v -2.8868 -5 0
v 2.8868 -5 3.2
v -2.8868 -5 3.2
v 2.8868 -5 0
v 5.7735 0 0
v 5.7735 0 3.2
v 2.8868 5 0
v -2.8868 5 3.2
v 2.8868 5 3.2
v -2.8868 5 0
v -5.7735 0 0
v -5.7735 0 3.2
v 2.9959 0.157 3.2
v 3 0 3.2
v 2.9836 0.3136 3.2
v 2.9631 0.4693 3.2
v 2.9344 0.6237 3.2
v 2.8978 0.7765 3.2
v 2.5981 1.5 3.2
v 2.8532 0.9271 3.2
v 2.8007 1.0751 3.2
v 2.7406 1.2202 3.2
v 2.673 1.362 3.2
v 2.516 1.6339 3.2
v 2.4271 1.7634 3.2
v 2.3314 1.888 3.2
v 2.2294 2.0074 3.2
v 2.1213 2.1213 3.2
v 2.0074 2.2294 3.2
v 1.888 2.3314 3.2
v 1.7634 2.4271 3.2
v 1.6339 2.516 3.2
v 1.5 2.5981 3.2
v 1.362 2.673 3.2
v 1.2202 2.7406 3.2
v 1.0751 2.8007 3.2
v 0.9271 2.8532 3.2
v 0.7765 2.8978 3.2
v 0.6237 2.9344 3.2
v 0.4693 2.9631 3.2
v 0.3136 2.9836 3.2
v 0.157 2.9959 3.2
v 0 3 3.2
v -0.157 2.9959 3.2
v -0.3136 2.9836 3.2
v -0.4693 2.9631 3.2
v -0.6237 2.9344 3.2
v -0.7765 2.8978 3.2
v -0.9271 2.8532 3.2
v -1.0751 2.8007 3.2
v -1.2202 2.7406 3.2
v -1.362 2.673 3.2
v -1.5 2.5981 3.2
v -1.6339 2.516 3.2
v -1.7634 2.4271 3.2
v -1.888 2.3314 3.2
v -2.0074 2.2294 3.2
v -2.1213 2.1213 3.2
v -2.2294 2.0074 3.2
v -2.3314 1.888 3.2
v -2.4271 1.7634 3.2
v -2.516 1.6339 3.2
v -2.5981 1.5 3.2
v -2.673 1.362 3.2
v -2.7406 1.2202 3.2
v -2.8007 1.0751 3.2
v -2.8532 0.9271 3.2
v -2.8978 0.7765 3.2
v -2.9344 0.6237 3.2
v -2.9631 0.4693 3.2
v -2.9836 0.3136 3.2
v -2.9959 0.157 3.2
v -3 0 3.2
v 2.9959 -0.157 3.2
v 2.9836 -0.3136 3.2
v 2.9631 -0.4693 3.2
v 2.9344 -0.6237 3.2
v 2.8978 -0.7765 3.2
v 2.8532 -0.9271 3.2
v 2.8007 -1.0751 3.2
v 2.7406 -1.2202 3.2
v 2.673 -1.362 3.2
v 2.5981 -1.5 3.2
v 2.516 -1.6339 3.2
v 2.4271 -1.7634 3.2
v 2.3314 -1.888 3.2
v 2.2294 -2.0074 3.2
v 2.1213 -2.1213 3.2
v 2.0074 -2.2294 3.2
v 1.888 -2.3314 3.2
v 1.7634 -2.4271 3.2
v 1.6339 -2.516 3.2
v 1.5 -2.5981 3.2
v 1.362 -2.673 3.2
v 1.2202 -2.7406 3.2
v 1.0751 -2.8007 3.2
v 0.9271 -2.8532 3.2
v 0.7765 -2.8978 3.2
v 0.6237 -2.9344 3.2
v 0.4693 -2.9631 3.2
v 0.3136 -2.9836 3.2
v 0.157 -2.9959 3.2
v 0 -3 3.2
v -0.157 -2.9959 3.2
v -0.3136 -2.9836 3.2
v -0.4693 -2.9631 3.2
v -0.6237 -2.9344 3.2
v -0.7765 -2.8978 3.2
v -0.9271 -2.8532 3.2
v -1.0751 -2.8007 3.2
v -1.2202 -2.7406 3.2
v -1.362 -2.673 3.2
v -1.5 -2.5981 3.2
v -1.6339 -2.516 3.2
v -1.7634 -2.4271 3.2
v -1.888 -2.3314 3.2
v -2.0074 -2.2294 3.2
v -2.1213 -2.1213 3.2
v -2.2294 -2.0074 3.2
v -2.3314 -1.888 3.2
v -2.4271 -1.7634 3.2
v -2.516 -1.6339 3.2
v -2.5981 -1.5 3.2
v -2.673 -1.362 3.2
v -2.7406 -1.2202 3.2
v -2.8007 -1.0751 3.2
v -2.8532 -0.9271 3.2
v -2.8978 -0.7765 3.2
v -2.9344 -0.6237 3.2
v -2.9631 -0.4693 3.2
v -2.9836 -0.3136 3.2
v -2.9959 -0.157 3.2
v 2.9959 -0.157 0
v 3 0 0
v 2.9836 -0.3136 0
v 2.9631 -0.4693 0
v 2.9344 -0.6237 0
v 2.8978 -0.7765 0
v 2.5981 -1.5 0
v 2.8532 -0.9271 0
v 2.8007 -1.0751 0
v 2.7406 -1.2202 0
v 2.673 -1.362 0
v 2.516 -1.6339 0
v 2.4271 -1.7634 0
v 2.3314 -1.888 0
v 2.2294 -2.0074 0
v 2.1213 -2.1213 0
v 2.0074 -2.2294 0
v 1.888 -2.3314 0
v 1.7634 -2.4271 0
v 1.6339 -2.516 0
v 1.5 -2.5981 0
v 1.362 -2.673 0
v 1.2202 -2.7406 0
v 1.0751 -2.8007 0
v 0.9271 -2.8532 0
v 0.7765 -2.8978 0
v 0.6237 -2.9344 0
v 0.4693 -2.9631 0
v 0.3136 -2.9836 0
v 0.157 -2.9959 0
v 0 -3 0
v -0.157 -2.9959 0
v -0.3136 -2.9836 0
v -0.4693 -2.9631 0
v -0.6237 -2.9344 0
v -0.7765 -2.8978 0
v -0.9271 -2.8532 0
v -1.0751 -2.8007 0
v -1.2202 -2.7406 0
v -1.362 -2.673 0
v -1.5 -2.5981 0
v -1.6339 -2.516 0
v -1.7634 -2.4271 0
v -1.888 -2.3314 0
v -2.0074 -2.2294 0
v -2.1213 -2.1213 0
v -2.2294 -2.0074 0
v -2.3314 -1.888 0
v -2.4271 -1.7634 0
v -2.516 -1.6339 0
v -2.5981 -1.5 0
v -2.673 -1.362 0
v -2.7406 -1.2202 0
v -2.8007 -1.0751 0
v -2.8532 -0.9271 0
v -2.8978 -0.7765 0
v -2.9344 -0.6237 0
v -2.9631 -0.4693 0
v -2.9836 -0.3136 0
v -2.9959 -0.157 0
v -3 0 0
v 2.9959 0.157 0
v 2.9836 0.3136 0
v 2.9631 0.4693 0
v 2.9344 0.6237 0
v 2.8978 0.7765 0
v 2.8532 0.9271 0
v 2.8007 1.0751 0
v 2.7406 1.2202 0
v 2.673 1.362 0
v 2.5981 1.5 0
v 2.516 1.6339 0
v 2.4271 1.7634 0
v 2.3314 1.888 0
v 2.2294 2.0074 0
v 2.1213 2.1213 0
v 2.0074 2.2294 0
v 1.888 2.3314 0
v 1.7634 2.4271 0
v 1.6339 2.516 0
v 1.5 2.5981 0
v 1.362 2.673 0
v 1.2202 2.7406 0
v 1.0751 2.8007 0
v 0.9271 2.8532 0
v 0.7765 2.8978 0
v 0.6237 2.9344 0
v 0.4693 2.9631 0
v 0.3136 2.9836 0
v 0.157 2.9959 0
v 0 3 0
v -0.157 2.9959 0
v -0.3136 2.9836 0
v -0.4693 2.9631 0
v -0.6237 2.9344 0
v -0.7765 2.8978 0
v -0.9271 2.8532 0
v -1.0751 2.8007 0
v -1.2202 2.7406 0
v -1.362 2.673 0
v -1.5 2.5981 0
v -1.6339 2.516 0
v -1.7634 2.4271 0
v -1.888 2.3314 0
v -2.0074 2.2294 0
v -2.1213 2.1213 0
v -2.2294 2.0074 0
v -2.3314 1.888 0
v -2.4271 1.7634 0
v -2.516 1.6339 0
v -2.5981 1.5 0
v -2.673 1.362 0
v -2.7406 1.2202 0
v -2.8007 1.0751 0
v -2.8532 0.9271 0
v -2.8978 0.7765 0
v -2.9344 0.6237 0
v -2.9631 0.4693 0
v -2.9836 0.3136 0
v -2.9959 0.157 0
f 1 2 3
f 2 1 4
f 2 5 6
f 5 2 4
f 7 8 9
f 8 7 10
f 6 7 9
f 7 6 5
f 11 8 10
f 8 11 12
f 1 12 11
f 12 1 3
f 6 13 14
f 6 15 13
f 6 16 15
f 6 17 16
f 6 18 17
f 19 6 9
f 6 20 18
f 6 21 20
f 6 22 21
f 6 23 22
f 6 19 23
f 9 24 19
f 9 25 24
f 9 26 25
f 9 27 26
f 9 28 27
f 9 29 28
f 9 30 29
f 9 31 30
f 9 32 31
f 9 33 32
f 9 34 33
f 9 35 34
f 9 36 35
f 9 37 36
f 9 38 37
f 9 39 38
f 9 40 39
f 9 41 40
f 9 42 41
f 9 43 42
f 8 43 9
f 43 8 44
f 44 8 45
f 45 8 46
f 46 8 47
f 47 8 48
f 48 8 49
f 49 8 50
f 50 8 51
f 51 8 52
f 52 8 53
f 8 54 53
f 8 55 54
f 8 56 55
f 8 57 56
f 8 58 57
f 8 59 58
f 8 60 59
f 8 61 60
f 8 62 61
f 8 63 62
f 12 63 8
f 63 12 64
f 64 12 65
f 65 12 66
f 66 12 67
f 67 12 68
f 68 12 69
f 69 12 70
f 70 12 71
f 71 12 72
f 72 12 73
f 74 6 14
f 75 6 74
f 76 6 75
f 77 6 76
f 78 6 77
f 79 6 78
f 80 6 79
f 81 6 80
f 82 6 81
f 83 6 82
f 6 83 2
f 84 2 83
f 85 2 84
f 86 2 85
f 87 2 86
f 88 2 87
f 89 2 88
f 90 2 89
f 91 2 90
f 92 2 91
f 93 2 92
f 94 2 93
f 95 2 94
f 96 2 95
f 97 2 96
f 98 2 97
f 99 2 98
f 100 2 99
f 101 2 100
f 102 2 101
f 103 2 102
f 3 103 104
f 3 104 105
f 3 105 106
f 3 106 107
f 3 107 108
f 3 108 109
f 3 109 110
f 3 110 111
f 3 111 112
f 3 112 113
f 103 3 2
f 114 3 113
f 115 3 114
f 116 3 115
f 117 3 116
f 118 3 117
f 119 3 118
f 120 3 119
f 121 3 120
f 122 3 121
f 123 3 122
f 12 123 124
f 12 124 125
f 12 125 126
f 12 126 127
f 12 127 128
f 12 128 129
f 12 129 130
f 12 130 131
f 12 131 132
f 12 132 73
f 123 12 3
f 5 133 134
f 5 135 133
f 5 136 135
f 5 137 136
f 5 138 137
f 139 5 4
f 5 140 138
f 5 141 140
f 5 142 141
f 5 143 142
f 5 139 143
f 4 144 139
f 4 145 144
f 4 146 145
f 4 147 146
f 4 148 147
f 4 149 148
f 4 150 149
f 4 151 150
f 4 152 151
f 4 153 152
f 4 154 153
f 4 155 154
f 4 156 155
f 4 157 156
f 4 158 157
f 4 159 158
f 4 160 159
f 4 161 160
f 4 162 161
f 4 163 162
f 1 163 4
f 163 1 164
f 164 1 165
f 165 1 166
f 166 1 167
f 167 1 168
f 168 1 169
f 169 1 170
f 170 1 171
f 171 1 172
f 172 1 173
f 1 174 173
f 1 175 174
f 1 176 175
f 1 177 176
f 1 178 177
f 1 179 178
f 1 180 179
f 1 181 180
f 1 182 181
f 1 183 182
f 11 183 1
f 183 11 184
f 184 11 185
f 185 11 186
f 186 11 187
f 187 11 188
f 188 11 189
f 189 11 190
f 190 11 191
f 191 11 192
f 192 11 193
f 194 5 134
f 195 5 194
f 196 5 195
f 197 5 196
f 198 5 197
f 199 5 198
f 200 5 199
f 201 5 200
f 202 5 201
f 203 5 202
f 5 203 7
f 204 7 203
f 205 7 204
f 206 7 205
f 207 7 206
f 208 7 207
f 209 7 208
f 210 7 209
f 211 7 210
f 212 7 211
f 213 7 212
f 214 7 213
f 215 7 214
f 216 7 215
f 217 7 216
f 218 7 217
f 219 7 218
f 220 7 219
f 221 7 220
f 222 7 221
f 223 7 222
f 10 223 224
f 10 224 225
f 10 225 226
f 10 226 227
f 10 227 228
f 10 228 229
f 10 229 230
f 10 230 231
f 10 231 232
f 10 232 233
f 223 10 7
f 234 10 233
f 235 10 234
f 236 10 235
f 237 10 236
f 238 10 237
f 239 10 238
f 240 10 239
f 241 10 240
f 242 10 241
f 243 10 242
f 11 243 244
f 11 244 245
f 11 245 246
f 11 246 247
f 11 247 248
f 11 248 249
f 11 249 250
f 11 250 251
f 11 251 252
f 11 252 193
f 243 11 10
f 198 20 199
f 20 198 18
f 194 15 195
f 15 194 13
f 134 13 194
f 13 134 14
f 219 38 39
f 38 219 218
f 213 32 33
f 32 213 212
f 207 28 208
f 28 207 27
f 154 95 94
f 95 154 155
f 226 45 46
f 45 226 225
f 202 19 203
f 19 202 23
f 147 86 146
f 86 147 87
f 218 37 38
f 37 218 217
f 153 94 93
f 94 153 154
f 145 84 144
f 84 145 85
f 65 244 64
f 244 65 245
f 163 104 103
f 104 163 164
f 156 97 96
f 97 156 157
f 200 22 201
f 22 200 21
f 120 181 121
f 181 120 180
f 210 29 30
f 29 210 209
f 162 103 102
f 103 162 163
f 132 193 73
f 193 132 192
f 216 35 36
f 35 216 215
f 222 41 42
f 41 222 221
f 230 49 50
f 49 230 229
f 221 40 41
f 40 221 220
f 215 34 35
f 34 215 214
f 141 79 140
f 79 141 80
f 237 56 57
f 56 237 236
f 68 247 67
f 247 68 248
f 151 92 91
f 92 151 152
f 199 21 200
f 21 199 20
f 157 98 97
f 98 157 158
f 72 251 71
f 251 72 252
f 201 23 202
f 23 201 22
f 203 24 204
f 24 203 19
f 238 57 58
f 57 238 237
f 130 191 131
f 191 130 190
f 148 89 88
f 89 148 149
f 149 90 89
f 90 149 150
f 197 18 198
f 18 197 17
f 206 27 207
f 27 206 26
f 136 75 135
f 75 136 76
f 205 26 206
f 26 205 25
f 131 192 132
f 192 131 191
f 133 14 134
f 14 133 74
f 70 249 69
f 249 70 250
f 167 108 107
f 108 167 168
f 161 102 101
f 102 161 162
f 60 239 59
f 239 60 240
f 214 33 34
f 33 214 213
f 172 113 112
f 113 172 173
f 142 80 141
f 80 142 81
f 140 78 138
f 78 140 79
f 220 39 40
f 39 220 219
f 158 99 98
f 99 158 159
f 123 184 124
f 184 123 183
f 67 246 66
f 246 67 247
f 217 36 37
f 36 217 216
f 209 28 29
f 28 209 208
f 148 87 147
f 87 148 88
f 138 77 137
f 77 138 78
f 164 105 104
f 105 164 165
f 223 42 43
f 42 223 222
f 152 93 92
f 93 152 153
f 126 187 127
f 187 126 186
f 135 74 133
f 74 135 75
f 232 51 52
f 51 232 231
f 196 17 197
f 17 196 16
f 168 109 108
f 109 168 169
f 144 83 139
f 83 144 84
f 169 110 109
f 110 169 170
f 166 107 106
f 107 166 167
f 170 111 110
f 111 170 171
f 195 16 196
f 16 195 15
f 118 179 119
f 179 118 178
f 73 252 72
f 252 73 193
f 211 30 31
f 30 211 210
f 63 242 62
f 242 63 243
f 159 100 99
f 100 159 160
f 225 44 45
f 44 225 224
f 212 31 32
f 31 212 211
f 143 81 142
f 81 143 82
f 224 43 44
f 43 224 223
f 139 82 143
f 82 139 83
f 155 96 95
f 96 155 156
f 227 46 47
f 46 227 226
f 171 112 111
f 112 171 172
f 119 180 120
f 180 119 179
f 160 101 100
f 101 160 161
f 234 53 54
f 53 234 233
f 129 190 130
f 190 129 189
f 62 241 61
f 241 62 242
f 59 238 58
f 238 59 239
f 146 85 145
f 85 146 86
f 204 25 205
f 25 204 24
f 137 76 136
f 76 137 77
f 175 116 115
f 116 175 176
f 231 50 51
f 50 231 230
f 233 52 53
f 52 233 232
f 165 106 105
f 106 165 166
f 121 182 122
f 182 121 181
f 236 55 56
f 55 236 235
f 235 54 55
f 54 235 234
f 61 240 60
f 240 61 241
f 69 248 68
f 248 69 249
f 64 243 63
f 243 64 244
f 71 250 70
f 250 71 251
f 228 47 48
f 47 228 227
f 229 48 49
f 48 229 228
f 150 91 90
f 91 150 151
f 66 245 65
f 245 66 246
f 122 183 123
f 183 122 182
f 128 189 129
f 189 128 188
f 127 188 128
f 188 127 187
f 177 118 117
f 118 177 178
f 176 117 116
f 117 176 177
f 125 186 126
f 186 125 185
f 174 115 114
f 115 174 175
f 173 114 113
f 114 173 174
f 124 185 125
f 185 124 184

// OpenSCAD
$fn = 120;

across_flats = 10.0;   // mm
thickness    = 3.2;    // mm
hole_d       = 6.0;    // mm (clearance as specified)

module hex_prism_af(af, h) {
    // For a regular hexagon, across flats = 2 * apothem.
    // Circumradius R = apothem / cos(30°) = (af/2) / cos(30°)
    R = (af/2) / cos(30);
    cylinder(h = h, r = R, $fn = 6);
}

difference() {
    hex_prism_af(across_flats, thickness);
    translate([0,0,-0.2])
        cylinder(h = thickness + 0.4, d = hole_d, $fn = 120);
}
